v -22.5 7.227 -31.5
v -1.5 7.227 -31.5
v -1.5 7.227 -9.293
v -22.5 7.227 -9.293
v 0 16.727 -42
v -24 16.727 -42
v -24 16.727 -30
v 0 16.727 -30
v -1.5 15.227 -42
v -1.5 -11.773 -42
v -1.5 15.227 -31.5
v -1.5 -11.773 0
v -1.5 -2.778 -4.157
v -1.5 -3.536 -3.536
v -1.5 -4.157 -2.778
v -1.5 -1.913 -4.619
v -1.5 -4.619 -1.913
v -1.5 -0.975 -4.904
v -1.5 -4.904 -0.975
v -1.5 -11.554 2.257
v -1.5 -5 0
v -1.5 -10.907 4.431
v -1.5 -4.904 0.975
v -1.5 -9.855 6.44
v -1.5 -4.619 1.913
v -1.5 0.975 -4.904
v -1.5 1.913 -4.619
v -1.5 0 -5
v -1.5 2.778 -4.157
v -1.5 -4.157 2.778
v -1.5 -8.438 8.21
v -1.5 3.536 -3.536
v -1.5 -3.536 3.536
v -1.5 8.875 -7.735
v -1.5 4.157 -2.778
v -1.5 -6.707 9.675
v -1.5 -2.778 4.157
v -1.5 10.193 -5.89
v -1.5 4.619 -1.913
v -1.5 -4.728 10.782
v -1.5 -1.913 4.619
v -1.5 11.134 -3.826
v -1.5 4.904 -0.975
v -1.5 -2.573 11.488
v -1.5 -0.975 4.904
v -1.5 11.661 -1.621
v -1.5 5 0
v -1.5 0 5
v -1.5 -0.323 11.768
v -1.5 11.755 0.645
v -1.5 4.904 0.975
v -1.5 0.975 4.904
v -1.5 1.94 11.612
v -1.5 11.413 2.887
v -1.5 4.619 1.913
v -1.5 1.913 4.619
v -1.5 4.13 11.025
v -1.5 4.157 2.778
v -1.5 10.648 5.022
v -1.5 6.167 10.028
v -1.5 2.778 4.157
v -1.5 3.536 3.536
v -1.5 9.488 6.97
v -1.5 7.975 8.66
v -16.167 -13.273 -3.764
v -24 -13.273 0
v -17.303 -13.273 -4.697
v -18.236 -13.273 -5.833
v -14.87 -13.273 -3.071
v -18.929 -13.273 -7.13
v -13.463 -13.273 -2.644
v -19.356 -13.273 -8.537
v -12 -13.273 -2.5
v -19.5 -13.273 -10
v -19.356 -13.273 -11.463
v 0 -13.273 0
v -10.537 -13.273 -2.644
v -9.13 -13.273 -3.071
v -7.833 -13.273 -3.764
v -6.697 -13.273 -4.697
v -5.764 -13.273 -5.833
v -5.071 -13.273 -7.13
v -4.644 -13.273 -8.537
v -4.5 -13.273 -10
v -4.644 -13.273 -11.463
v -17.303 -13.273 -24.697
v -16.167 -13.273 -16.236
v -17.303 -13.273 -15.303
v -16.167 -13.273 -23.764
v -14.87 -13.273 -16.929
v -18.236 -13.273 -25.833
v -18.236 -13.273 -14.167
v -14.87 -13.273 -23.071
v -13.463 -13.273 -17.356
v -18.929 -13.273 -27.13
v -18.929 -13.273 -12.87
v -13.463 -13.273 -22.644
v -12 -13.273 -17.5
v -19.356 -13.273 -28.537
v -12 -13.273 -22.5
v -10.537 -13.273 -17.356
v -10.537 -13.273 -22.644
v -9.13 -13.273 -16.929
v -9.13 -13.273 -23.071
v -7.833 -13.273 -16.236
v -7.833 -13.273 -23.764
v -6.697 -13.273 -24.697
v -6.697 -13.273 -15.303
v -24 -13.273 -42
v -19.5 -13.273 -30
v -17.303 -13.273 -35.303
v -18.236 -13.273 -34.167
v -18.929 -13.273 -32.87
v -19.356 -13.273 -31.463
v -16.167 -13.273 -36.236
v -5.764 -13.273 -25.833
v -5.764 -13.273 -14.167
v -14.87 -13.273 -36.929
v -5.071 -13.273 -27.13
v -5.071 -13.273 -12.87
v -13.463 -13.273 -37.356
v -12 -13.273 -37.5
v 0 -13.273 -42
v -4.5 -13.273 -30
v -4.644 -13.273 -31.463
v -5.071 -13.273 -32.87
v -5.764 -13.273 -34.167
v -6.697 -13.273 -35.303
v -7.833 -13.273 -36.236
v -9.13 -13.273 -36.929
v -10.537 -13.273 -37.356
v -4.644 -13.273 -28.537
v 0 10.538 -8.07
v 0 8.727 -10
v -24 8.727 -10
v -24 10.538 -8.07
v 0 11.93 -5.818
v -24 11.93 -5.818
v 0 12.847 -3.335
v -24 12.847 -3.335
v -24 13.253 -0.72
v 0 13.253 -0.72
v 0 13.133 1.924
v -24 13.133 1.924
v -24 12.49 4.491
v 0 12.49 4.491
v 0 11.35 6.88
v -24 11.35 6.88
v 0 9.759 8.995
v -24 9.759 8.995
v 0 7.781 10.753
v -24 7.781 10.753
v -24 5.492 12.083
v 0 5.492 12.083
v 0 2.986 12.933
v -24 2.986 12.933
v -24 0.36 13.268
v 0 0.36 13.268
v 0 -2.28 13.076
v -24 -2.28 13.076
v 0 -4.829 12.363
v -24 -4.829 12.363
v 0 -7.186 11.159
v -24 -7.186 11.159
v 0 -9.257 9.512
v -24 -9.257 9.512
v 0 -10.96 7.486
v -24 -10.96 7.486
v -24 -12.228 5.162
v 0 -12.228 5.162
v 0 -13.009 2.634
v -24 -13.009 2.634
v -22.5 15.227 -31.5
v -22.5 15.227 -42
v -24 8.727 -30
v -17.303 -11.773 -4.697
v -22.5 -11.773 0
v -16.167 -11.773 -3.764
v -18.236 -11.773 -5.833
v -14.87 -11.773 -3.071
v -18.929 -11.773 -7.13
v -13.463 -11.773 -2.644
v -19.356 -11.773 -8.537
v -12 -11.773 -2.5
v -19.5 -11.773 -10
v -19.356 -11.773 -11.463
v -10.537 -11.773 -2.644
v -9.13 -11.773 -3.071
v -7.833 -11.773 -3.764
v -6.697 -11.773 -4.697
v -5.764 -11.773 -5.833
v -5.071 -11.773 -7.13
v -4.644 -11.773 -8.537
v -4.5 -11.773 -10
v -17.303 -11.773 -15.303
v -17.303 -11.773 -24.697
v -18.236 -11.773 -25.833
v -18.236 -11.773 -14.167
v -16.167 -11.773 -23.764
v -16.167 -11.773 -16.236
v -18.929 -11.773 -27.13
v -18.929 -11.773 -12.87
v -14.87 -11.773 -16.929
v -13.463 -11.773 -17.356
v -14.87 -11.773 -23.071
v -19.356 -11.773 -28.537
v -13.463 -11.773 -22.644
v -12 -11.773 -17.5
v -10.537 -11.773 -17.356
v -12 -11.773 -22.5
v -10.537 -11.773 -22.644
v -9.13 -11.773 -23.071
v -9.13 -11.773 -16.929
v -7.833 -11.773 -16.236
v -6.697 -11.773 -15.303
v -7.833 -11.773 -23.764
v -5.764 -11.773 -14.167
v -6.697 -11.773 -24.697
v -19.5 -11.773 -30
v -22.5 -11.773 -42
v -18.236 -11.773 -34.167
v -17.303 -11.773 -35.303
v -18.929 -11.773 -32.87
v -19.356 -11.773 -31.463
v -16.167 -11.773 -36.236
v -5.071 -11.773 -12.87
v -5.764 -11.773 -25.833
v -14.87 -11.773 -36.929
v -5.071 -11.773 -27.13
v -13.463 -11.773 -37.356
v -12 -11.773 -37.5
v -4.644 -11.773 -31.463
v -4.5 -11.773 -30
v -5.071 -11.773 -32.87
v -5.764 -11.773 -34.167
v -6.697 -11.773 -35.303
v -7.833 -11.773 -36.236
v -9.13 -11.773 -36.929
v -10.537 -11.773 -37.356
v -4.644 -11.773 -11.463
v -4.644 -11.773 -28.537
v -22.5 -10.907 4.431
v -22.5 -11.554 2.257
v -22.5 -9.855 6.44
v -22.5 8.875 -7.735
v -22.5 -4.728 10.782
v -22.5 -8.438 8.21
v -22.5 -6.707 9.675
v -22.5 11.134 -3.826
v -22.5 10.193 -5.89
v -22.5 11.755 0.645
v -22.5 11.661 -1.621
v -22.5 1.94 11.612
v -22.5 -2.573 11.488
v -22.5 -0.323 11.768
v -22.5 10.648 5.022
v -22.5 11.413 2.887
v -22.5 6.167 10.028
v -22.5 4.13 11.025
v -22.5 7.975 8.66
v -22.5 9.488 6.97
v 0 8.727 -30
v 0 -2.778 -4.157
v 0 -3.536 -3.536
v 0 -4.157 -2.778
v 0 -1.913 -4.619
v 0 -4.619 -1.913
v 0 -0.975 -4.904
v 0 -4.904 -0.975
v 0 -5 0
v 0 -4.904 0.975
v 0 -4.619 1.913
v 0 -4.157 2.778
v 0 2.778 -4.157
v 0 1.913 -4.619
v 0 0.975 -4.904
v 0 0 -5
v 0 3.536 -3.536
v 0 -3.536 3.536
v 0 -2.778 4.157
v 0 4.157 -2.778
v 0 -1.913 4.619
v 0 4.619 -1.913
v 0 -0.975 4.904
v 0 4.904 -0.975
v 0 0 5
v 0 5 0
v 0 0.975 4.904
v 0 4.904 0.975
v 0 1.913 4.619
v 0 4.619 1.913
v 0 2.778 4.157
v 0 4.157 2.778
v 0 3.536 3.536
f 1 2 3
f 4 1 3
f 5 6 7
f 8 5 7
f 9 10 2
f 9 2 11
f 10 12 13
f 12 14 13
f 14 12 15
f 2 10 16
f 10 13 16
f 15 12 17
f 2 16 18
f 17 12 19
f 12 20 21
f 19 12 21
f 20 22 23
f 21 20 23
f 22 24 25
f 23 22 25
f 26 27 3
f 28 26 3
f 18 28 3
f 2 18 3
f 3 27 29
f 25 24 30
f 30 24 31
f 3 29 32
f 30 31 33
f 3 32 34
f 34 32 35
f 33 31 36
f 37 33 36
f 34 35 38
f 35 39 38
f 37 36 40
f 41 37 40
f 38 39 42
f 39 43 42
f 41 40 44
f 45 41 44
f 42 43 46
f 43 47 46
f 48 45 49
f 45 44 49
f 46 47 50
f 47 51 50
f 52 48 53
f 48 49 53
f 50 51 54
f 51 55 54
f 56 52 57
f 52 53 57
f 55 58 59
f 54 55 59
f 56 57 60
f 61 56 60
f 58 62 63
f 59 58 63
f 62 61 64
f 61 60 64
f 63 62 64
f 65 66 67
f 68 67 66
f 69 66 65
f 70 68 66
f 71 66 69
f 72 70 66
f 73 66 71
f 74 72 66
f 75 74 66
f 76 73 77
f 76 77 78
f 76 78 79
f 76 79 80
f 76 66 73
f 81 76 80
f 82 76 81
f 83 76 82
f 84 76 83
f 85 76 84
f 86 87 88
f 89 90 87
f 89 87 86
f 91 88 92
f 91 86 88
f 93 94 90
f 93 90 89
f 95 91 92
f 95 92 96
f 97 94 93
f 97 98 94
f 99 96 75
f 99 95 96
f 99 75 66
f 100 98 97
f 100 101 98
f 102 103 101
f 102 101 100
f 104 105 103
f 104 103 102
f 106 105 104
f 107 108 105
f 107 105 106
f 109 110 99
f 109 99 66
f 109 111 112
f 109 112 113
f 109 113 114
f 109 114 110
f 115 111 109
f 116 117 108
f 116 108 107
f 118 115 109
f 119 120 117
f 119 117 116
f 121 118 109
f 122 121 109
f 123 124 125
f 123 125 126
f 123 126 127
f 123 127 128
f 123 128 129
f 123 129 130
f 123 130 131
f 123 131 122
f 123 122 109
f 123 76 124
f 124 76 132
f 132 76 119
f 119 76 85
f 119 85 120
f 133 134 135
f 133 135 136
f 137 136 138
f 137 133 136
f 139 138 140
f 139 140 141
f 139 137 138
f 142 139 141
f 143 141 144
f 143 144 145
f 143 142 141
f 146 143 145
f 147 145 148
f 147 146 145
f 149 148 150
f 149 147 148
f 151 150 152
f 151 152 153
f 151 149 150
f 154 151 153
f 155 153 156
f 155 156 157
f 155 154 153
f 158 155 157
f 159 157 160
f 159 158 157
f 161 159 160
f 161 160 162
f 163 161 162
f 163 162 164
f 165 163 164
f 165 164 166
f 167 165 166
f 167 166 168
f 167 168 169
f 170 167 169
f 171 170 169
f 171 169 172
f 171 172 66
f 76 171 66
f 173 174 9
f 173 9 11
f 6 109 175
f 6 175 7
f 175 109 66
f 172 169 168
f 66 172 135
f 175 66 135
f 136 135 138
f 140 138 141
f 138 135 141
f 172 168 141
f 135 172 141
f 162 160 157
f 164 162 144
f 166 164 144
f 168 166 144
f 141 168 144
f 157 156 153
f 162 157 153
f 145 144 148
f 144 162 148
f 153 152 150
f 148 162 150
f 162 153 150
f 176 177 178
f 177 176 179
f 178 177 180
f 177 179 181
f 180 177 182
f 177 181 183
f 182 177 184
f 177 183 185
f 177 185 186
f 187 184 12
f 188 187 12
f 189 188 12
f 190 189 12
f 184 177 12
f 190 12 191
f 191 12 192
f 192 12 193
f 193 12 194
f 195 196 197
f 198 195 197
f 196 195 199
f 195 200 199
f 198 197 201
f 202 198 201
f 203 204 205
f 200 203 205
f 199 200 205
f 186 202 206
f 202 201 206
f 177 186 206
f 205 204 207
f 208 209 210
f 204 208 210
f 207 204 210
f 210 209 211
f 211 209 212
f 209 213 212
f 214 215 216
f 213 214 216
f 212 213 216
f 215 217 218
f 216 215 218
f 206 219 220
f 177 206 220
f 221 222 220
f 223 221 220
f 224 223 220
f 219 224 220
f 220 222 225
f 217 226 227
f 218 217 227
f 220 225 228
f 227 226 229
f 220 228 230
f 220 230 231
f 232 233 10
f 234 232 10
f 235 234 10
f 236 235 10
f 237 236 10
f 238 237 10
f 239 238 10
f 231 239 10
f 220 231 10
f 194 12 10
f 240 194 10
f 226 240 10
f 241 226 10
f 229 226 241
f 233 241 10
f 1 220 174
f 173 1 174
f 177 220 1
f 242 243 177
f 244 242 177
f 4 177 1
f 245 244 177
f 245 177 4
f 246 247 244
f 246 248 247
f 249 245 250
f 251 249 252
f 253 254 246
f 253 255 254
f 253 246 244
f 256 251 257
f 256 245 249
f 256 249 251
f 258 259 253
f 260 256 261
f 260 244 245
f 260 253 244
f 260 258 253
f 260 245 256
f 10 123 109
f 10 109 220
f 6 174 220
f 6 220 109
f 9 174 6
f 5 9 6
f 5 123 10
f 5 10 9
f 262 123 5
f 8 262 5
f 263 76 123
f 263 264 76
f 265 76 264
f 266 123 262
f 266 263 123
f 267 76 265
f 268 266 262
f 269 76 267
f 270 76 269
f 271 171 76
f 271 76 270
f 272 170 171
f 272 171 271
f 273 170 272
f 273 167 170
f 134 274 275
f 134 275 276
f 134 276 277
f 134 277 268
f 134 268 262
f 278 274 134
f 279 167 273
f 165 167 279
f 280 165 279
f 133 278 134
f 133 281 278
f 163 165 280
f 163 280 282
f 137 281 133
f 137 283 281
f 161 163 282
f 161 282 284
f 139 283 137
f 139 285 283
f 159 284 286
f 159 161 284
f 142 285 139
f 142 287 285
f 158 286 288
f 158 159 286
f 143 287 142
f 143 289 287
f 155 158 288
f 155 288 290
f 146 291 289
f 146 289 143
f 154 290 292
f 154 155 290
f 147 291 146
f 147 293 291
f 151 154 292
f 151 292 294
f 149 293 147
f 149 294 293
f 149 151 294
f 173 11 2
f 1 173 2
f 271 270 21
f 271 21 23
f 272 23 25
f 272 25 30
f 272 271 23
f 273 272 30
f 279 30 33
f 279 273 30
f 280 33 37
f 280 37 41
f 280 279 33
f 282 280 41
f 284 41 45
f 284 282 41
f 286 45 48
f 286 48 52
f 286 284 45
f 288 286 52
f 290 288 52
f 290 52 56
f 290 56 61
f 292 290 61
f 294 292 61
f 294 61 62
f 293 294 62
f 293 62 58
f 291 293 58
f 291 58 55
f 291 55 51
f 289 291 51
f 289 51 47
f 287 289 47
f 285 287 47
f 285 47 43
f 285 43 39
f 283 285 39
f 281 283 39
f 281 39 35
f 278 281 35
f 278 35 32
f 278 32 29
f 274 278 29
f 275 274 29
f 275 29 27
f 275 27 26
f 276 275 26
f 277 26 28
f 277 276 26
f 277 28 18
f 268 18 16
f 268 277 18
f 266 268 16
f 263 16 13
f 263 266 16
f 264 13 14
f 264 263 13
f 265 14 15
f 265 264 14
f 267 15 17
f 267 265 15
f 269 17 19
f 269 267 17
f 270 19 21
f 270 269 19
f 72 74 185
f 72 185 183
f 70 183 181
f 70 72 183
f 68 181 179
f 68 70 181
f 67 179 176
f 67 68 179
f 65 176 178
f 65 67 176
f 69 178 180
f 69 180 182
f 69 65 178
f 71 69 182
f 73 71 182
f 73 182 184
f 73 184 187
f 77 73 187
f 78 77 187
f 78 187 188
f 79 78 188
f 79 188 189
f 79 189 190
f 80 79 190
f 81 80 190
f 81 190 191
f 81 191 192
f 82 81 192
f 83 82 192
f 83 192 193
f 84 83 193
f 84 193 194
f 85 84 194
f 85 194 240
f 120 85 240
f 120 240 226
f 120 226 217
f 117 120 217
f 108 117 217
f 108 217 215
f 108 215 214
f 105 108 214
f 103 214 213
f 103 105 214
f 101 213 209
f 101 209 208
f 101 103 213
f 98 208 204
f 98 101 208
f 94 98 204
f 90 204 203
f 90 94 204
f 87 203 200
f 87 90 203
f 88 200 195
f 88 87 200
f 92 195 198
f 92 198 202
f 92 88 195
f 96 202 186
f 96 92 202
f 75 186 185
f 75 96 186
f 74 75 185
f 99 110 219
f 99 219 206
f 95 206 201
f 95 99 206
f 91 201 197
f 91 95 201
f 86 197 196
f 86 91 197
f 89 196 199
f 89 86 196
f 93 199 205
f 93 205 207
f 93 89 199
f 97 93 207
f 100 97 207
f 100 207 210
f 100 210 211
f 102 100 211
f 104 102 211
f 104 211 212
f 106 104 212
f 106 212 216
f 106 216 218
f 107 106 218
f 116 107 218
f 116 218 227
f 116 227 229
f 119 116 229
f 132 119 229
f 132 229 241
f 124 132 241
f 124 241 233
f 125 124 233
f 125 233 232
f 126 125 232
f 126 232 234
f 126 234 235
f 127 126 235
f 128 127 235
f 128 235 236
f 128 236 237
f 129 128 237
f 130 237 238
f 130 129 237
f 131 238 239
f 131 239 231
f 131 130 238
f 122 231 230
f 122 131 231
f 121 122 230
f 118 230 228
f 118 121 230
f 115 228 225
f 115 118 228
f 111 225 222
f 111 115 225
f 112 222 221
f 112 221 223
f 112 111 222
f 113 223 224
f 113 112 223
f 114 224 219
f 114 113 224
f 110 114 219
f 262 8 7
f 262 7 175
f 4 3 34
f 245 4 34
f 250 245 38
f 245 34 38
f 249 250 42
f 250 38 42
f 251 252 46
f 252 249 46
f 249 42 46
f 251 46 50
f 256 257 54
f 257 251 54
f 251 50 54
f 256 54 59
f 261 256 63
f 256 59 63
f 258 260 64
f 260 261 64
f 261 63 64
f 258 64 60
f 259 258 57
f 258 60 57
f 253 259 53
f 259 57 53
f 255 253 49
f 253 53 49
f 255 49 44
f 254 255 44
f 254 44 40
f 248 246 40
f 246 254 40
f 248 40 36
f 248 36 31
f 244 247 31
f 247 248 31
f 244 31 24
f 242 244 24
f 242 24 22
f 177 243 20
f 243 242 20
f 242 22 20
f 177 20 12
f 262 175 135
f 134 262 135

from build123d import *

# Parameters (mm, degrees)
F1_DEPTH = 24
F2_T     = -1.5
F3_R     = 5
F4_DEPTH = 5
F5_R     = 7.5
F6_DEPTH = 5


with BuildPart() as f1:
    # F0 (on Right) → F1 (new body)
    with BuildSketch(Plane.YZ):
        with BuildLine():
            Line((8.7272727273, -30), (8.7272727273, -10))
            ThreePointArc((8.7272727273, -10), (5.4922936244, 12.0830459736), (-13.2727272727, 0))
            Line((-13.2727272727, 0), (-13.2727272727, -42))
            Line((-13.2727272727, -42), (16.7272727273, -42))
            Line((16.7272727273, -42), (16.7272727273, -30))
            Line((16.7272727273, -30), (8.7272727273, -30))
        make_face()
    extrude(amount=F1_DEPTH)

    # F2
    f2_openings = [f1.faces().sort_by_distance(p)[0] for p in [
        (12, 1.727273, -42),
    ]]
    offset(amount=F2_T, openings=f2_openings, kind=Kind.INTERSECTION)

    # F3 (on face) → F4 (cut)
    with BuildSketch(Plane(origin=(0, 0, 0), x_dir=(0, -1, 0), z_dir=(-1, 0, 0))):
        Circle(F3_R)
    extrude(amount=-F4_DEPTH, mode=Mode.SUBTRACT)

    # F5 (on face) → F6 (cut)
    with BuildSketch(Plane.XZ.offset(13.2727272727)):
        with Locations((12, -10)):
            Circle(F5_R)
        with Locations((12, -30)):
            Circle(F5_R)
    extrude(amount=-F6_DEPTH, mode=Mode.SUBTRACT)


with BuildPart() as f7_1:
    # F7: instance of F1
    add(f1.part.mirror(Plane(origin=(0, -0.4359832268, -17.1422397222), x_dir=(0, 1, 0), z_dir=(-1, 0, 0))))


solid = f7_1.part
